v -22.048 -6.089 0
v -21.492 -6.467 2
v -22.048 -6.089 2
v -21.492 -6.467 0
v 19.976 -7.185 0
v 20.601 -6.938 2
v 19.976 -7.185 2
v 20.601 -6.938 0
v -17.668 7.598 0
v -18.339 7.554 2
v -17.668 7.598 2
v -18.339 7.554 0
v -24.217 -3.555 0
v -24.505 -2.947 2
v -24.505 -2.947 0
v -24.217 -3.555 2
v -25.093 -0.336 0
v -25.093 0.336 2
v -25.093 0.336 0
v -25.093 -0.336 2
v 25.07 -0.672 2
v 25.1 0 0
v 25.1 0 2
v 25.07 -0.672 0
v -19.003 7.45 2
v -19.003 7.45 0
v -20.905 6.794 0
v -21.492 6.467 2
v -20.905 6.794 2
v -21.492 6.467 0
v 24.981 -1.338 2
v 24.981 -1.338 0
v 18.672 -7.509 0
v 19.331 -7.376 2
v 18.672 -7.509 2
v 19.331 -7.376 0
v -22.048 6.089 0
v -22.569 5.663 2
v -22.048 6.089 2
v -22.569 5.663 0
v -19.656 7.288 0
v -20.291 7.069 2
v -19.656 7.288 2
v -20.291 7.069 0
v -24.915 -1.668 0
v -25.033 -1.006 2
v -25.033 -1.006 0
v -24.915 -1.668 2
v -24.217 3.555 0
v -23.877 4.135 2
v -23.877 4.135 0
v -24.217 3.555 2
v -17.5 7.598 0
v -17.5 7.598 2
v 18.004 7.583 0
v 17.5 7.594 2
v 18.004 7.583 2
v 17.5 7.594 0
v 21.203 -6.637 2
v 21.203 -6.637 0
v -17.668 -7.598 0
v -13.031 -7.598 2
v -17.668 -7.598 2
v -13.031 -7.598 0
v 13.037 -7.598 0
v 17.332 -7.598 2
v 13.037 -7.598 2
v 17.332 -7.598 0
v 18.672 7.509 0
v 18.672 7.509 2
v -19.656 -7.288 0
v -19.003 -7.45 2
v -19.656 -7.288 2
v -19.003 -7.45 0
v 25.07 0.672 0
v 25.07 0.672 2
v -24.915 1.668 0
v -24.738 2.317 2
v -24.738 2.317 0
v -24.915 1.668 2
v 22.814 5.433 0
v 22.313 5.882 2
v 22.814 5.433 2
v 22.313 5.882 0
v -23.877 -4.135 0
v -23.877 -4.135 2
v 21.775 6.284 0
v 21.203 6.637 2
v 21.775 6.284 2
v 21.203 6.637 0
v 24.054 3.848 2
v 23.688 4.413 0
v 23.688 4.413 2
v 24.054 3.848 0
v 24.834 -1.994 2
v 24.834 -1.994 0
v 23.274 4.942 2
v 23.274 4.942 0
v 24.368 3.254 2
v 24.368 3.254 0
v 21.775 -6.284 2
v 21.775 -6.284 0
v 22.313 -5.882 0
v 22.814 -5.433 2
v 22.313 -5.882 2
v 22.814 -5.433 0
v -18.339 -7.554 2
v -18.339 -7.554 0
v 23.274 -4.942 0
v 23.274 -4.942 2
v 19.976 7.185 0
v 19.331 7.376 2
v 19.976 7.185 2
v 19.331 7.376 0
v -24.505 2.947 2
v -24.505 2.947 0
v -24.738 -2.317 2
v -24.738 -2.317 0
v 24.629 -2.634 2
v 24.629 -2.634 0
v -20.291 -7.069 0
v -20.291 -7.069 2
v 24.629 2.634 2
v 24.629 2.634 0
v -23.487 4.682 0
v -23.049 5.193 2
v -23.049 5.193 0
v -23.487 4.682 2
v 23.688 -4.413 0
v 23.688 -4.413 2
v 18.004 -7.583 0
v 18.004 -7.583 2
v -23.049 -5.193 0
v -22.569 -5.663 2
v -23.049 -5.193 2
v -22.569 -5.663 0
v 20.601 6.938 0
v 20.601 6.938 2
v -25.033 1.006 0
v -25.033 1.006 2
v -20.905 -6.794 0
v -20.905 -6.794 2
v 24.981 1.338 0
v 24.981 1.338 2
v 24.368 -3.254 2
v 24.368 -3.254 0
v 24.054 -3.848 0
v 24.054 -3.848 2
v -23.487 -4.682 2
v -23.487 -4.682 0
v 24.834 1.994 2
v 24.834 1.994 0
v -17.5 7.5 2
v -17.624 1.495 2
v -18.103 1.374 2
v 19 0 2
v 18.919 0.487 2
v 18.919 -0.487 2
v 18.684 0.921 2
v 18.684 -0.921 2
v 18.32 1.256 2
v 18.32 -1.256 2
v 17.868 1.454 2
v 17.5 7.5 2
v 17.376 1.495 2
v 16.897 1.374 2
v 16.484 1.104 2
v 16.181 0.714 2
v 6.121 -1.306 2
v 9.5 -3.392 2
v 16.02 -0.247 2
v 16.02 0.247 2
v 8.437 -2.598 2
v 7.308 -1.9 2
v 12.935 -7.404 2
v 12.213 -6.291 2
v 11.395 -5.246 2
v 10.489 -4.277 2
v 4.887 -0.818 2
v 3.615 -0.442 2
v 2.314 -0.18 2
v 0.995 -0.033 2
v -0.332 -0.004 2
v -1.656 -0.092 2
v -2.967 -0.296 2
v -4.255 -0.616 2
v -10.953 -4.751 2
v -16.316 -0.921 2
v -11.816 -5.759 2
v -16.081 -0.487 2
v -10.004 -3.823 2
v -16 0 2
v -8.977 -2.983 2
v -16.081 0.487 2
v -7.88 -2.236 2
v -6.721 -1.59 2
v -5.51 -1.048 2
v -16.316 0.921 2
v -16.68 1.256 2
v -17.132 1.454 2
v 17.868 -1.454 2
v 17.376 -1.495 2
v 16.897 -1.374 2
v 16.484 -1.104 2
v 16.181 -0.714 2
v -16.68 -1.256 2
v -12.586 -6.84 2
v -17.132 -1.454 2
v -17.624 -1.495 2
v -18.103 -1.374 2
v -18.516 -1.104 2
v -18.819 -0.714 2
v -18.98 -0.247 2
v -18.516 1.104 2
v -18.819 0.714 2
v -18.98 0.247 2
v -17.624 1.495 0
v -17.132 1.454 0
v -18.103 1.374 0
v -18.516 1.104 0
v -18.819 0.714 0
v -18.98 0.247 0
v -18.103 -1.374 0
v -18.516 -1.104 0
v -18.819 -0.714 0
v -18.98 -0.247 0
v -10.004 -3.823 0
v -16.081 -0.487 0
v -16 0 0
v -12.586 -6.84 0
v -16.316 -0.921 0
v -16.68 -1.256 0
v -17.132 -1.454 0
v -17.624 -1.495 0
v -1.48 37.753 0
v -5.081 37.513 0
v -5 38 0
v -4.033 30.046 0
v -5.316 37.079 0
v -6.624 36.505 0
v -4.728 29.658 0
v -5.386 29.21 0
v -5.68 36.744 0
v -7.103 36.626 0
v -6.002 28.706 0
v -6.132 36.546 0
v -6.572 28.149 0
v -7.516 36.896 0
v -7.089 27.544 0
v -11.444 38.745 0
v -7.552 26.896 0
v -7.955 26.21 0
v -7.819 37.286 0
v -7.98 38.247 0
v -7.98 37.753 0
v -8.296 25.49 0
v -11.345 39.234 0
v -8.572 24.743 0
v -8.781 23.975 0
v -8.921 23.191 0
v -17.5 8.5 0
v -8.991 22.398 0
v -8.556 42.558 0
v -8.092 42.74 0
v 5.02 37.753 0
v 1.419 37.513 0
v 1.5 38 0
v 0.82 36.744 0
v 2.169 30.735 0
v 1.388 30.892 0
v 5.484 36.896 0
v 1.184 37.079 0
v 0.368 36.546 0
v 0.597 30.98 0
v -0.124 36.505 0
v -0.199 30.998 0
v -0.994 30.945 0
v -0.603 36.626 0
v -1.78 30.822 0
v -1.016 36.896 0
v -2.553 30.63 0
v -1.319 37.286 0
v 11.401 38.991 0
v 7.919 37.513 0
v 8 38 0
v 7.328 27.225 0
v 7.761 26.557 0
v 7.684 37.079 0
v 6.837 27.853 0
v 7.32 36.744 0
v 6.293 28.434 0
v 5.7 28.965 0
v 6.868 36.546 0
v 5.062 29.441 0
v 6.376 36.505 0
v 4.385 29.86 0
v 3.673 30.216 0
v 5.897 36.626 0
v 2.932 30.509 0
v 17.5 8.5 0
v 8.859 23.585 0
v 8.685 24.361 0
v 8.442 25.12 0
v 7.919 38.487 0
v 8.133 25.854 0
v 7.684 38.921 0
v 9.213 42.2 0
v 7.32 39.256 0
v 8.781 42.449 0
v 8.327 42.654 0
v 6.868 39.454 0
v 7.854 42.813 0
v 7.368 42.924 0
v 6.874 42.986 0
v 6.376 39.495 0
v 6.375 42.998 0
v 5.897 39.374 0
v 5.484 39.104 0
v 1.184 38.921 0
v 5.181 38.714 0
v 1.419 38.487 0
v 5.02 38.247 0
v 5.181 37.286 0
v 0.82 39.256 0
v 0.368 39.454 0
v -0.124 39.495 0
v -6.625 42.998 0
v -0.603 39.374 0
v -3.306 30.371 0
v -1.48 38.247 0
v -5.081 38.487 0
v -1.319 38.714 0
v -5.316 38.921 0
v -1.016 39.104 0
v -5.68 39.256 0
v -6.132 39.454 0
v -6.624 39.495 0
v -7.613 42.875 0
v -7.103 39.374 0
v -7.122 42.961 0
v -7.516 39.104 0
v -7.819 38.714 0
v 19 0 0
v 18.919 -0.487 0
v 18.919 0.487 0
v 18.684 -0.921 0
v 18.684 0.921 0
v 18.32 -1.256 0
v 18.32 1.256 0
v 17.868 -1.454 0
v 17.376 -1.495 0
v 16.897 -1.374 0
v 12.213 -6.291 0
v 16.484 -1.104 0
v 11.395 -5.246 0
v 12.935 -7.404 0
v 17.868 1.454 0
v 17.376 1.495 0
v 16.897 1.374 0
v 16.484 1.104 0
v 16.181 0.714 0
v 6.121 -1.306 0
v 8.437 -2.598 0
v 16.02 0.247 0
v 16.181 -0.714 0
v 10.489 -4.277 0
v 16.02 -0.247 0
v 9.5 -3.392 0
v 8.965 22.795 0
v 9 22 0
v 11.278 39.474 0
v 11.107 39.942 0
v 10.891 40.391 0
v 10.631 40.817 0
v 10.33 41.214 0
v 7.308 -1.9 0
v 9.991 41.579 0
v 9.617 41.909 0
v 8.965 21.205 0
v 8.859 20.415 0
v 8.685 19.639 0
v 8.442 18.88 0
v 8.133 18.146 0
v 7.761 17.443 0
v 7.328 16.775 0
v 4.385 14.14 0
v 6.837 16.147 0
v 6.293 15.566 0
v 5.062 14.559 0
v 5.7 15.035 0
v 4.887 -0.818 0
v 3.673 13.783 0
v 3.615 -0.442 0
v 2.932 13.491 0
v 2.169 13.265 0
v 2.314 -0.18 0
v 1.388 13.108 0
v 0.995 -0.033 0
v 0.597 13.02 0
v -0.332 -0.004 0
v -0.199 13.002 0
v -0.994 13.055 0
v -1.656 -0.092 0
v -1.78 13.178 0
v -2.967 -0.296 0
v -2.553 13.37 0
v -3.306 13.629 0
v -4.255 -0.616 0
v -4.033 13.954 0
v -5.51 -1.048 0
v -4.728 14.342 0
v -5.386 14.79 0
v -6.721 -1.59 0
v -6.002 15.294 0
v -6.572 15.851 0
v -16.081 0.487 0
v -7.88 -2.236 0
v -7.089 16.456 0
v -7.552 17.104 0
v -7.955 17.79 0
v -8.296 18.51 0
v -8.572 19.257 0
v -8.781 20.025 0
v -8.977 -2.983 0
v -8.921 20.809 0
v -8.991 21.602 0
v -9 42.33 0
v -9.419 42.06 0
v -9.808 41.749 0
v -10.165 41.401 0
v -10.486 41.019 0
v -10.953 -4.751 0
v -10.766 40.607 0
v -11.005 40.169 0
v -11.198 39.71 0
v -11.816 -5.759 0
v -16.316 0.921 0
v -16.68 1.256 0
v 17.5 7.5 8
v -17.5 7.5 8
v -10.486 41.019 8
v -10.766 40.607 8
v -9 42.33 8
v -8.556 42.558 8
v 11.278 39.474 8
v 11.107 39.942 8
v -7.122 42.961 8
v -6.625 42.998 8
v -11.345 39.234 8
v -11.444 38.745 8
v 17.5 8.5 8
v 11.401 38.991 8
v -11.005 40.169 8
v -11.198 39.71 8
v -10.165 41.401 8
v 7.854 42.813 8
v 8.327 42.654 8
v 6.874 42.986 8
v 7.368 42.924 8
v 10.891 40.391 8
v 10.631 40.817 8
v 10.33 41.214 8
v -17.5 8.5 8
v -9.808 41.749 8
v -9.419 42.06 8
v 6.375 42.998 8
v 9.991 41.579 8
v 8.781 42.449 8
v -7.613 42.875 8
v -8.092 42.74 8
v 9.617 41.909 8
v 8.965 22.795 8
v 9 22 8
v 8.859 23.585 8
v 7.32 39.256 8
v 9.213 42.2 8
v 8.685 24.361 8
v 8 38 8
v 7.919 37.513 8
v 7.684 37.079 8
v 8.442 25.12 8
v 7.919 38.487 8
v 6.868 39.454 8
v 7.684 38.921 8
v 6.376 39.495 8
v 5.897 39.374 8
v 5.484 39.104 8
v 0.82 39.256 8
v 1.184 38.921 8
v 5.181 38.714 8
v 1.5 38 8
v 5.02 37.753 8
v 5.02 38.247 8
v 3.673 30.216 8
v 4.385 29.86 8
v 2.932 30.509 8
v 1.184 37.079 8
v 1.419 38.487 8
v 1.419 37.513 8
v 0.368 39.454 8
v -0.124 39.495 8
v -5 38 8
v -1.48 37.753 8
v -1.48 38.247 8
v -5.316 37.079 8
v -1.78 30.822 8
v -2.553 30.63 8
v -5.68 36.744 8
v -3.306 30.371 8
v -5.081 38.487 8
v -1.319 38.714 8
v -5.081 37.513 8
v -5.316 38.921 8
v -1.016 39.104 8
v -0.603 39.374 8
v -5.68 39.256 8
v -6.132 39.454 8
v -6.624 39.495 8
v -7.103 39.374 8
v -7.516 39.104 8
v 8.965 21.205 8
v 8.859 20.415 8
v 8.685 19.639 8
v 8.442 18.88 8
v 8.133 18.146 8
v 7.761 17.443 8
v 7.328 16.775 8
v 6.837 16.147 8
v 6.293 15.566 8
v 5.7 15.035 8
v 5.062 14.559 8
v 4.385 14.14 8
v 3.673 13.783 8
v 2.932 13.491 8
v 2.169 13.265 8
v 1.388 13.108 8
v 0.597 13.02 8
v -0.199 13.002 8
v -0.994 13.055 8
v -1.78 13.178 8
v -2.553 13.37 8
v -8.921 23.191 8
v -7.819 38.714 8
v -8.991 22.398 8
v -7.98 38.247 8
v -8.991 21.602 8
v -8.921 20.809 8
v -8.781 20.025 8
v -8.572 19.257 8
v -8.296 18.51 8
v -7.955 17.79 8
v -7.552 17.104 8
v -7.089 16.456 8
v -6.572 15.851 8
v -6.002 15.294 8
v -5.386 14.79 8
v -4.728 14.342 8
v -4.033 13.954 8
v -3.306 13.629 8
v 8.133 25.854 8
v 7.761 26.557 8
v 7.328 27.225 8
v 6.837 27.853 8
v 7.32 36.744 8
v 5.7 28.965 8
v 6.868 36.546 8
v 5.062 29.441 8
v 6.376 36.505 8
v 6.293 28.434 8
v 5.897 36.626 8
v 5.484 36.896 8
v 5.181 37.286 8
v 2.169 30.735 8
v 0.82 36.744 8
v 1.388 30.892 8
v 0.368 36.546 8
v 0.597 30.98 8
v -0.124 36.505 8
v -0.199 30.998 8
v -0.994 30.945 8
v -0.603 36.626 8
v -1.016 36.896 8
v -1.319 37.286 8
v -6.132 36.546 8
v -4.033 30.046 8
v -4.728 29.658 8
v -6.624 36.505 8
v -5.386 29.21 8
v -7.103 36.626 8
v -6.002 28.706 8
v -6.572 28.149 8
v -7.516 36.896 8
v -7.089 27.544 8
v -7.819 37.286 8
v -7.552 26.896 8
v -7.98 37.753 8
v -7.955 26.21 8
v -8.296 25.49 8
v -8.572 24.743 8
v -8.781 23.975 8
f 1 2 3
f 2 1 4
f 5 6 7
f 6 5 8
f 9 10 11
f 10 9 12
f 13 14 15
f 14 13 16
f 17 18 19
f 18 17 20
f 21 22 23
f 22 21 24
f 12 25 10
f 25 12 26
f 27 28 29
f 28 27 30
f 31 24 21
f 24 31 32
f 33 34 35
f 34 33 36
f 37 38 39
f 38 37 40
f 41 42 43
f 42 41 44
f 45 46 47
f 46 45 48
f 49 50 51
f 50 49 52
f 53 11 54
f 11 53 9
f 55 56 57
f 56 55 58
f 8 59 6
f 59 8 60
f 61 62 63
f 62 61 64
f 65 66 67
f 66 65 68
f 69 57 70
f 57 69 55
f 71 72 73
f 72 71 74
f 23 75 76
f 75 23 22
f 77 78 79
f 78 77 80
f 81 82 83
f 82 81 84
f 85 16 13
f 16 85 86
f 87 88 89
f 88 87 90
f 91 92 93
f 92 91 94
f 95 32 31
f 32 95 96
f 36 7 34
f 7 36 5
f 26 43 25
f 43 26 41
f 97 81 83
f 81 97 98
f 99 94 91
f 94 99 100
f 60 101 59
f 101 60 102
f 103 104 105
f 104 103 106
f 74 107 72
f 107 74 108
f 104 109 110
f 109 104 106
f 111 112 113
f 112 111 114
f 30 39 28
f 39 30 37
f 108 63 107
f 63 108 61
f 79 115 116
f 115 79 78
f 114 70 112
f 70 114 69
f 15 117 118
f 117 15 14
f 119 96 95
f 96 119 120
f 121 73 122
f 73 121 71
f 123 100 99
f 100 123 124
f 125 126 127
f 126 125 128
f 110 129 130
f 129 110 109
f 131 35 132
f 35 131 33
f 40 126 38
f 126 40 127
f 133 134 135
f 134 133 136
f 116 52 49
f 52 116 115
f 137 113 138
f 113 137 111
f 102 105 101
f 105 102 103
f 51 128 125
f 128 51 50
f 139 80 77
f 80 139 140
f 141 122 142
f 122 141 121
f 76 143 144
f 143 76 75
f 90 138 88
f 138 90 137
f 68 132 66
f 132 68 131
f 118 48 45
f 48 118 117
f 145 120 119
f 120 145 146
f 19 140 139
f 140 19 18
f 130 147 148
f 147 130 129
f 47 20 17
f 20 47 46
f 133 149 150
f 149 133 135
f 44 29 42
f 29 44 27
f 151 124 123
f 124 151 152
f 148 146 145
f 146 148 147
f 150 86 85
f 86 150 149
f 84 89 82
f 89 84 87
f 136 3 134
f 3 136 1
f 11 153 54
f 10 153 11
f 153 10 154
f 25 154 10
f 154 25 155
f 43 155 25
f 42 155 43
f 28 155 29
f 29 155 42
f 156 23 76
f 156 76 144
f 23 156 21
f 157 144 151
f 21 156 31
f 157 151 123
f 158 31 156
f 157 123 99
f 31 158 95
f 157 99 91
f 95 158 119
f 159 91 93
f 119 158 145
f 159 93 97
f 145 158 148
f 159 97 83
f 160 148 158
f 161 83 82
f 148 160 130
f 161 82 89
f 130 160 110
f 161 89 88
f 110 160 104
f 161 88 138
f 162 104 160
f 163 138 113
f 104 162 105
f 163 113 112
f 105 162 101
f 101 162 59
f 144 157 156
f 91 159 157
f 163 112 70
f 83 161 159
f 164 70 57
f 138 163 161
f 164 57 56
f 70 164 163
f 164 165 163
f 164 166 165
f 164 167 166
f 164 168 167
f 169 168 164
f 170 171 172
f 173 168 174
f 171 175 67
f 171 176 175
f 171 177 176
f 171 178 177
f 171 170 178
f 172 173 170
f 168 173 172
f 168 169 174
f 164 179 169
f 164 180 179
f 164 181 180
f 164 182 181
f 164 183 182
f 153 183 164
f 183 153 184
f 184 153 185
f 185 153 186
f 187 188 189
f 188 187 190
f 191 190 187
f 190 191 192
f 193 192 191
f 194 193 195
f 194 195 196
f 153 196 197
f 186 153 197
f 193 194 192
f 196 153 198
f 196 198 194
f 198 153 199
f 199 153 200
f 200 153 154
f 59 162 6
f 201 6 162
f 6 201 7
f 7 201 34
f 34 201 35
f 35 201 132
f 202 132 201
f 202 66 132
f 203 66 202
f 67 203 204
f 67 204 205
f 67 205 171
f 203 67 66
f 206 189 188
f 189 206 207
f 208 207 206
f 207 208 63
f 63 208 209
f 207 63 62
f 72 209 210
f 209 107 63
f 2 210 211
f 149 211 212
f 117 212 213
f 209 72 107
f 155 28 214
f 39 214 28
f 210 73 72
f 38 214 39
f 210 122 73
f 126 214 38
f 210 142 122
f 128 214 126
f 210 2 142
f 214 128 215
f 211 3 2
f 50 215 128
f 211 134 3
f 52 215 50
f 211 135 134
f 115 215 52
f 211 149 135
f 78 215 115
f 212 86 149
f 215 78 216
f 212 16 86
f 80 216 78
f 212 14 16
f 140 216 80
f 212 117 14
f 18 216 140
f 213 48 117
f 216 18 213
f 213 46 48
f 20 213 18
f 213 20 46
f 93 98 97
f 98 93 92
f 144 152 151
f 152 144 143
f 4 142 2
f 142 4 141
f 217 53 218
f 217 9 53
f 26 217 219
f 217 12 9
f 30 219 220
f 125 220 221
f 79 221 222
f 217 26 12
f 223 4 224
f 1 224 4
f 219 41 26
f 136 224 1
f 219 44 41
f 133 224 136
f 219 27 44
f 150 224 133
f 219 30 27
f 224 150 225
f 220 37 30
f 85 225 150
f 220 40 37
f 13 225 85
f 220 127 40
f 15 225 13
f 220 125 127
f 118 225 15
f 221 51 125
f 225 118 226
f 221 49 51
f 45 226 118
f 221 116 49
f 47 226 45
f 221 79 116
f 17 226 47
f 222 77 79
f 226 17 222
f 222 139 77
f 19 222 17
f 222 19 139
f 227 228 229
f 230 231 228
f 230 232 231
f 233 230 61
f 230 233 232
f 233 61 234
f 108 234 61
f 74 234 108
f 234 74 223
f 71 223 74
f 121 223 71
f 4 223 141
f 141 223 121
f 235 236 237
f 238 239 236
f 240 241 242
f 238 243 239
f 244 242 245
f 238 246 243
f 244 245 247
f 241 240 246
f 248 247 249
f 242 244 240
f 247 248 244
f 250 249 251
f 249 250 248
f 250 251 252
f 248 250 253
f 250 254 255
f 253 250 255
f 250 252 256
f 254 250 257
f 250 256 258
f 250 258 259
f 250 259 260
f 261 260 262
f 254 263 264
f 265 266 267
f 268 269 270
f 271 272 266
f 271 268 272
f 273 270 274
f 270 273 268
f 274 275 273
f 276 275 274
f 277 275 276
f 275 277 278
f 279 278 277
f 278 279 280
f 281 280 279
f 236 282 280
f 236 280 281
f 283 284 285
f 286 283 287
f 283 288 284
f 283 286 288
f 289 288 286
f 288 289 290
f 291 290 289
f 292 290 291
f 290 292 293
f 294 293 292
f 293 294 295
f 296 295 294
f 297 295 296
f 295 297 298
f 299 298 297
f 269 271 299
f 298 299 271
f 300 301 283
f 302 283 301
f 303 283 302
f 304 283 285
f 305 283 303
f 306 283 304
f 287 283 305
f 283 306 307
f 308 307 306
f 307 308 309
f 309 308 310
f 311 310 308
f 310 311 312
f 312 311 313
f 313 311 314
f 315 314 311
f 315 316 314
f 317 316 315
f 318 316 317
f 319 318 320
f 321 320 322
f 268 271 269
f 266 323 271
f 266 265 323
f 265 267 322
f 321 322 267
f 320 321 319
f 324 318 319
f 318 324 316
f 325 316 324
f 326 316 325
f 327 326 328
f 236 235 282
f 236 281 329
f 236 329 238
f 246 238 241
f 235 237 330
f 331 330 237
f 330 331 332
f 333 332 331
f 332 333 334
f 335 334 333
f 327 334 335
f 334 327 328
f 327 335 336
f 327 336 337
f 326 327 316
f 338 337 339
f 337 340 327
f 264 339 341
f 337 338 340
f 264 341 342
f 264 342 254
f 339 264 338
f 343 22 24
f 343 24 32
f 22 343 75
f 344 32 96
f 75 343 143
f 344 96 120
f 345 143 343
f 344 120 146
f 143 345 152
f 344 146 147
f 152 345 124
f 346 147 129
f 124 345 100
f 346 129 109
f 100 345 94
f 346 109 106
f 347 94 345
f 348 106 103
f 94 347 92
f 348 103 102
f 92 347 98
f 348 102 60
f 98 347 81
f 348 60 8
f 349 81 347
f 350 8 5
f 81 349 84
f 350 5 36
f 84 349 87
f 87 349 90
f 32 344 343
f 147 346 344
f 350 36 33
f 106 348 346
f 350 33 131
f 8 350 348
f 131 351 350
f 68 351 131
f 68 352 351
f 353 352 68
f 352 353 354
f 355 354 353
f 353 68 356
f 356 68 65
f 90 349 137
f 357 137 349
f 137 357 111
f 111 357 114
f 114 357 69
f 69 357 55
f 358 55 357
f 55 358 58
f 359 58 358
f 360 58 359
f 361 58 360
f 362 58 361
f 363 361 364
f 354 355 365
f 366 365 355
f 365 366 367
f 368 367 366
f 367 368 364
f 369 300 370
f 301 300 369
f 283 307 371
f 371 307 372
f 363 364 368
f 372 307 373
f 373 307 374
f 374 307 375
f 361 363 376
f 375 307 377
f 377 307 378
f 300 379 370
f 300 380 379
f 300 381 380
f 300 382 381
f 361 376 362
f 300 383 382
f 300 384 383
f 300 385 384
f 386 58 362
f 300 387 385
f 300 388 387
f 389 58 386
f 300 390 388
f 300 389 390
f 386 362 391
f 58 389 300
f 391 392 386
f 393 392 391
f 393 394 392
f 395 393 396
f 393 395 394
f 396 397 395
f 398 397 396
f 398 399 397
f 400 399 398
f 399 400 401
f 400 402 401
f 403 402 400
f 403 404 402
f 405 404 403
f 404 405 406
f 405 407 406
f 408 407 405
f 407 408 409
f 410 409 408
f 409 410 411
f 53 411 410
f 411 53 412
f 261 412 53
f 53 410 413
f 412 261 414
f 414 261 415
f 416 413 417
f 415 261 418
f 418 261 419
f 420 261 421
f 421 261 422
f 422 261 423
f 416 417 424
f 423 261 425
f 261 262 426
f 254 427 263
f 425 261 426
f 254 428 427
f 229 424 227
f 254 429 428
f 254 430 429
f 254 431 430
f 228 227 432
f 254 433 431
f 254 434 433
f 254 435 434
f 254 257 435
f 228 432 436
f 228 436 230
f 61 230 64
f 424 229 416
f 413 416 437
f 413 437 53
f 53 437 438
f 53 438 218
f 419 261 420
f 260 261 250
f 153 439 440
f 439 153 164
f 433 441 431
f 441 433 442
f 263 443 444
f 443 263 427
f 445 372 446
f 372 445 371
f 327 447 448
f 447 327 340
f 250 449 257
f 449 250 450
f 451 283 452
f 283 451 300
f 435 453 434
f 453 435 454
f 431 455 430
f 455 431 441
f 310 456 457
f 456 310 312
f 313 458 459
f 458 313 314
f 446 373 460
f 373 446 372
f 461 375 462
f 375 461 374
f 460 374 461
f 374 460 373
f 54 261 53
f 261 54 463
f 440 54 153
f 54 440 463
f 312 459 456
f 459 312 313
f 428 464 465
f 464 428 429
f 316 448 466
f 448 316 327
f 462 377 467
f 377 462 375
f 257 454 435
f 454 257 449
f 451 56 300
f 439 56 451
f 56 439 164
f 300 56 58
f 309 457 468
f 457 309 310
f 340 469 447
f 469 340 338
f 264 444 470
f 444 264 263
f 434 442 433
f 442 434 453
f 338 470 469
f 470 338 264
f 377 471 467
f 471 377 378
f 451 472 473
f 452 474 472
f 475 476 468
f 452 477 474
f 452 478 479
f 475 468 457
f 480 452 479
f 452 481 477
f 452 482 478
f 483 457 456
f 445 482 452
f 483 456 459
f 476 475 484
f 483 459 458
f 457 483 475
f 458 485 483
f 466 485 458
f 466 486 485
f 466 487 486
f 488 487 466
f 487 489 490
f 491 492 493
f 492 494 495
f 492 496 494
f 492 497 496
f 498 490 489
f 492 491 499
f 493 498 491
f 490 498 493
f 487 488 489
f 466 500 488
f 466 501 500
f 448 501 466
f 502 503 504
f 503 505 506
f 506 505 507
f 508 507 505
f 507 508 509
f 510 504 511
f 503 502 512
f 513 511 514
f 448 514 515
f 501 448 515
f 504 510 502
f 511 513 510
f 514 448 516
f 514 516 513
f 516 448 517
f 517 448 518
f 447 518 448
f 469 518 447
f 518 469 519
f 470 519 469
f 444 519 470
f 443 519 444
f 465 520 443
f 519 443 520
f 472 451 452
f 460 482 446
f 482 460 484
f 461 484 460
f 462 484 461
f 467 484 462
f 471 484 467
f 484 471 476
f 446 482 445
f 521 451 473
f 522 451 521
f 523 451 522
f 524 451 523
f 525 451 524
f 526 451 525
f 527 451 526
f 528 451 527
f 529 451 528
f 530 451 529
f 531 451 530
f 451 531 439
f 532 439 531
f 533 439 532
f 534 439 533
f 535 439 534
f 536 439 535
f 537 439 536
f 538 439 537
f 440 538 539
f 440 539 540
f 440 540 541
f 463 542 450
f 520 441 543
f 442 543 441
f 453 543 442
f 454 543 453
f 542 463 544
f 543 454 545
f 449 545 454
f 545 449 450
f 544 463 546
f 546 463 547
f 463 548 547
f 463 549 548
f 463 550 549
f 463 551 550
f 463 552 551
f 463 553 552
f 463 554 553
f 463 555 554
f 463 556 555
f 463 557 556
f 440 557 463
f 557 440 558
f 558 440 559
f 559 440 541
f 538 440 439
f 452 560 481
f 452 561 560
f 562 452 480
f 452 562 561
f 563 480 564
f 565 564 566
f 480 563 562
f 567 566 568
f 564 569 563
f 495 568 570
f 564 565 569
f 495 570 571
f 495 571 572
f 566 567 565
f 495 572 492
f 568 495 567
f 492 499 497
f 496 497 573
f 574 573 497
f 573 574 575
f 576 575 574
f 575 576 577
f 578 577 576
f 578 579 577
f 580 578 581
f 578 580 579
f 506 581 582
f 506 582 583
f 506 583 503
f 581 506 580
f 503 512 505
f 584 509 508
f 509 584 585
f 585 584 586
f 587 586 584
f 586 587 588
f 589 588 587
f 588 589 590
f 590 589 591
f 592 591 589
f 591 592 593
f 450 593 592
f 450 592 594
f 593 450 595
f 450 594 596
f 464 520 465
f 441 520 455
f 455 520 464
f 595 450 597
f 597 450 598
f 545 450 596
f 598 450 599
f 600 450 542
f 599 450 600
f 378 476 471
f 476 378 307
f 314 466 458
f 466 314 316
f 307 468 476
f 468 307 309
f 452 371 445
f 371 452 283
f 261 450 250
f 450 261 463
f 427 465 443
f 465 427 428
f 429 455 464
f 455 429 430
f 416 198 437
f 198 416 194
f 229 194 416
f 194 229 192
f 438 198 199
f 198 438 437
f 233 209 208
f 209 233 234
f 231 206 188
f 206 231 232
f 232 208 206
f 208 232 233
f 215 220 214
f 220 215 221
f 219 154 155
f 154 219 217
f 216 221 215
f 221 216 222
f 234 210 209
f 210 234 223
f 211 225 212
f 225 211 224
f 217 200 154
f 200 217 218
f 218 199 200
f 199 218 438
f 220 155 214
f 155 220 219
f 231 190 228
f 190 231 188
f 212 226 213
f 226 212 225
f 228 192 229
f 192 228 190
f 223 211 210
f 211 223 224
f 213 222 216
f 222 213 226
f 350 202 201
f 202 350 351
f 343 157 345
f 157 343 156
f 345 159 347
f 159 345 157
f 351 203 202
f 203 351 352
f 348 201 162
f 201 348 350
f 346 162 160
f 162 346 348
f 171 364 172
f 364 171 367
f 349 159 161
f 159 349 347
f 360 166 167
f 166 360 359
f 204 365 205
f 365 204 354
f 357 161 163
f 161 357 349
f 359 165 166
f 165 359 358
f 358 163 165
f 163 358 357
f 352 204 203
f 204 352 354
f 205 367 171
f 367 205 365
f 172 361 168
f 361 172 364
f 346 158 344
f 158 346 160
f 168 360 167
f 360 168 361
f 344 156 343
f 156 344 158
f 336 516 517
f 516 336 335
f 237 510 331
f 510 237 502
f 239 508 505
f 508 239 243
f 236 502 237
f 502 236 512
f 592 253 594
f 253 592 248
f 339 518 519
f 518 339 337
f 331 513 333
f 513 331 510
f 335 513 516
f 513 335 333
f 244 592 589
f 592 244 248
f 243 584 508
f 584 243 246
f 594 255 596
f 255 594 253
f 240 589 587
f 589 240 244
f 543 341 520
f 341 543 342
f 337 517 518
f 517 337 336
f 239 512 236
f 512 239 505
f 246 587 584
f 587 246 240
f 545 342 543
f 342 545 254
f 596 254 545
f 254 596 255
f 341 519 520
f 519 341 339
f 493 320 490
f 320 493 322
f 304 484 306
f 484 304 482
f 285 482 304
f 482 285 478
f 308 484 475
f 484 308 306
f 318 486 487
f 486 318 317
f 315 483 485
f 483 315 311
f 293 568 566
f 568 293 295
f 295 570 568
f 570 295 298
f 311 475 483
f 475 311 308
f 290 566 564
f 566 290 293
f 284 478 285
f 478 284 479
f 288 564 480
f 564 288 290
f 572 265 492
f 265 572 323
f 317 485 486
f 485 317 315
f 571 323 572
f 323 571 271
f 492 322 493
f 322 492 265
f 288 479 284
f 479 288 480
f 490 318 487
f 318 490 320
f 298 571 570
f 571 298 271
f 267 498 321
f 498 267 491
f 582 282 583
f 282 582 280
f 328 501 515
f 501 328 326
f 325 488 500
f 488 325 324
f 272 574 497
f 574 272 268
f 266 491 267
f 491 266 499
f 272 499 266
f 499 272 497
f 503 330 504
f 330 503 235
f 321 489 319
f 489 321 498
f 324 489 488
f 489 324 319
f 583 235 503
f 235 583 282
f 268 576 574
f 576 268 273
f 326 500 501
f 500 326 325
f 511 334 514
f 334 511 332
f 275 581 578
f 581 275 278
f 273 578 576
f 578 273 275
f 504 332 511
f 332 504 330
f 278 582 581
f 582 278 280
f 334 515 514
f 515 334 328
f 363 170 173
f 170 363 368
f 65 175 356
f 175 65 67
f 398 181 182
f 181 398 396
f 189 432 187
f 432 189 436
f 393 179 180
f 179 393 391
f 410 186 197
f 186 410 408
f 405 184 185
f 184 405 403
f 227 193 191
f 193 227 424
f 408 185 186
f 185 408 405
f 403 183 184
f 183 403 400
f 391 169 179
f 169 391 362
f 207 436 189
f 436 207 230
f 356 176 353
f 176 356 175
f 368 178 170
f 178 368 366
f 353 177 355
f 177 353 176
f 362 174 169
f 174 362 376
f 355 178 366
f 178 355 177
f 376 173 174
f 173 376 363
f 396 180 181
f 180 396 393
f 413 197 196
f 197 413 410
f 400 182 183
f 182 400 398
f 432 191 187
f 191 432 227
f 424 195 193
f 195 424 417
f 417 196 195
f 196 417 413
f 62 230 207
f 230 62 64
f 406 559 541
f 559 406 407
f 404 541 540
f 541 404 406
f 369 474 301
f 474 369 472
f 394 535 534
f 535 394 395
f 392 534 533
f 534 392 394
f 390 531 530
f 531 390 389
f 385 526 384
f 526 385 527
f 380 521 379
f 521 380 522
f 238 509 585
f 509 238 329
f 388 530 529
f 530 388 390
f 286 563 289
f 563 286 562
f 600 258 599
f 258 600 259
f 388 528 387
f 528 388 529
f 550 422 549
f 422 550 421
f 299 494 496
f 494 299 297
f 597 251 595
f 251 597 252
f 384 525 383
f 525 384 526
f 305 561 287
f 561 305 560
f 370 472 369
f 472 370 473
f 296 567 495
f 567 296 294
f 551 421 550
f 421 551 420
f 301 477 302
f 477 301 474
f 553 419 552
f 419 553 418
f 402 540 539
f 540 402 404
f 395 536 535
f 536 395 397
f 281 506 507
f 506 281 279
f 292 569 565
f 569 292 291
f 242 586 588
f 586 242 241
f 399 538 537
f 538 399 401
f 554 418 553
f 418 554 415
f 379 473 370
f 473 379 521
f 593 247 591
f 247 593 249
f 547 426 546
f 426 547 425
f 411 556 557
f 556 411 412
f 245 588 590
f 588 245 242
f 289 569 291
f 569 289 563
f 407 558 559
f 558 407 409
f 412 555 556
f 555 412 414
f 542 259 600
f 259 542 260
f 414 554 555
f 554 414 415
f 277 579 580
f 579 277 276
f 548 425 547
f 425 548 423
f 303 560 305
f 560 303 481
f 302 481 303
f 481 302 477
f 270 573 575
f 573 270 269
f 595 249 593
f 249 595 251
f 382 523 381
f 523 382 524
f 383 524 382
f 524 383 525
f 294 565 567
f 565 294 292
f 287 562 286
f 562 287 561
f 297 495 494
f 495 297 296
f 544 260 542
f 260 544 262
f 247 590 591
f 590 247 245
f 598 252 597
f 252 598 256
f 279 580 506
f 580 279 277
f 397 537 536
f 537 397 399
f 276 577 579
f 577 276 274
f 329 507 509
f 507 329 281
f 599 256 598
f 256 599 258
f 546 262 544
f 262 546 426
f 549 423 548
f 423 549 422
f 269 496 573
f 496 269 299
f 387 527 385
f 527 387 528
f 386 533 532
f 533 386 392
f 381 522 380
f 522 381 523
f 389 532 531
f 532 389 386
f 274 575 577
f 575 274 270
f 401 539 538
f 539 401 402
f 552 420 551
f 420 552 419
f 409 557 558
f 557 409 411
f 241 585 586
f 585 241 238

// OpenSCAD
$fs = 0.5;
$fa = 5.1;


//lower_link(115);

suspension_mount();

module suspension_mount() {
    dd1 = 7.5*2+0.2;
    dd2 = 10;
    hh1 = 38;
    dist = 13;
    mount_dist = 35;
    wall1 = 2;
    wall2 = 8;
    difference() {
        union(){
            hull() {
                translate([-mount_dist/2,0,0]) cylinder(d=dd1, h=wall1);
                translate([mount_dist/2,0,0]) cylinder(d=dd1, h=wall1);
            }
            hull() {
                translate([-mount_dist/2,7.5,0])cube([mount_dist,1,wall2]);
                translate([-dist/2,hh1,0]) cylinder(d=dd2, h=wall2);
                translate([dist/2,hh1,0]) cylinder(d=dd2, h=wall2);
            }
            
            hull() {
                translate([-dist/2,hh1,0]) cylinder(d=dd2, h=wall2);
                translate([dist/2,hh1,0]) cylinder(d=dd2, h=wall2);
            }
            
        }
        
        translate([-mount_dist/2,0,0]) cylinder(d=3, h=wall1);
                translate([mount_dist/2,0,0]) cylinder(d=3, h=wall1);
        translate([-dist/2,hh1,0]) cylinder(d=3, h=wall2);
                translate([dist/2,hh1,0]) cylinder(d=3, h=wall2);
        translate([0,hh1,0]) cylinder(d=3, h=wall2);
        
        translate([0,-15,0]) cylinder(d=30, h=wall1);
        translate([0,22,0]) cylinder(d=18, h=wall2);   
    }
    
}
